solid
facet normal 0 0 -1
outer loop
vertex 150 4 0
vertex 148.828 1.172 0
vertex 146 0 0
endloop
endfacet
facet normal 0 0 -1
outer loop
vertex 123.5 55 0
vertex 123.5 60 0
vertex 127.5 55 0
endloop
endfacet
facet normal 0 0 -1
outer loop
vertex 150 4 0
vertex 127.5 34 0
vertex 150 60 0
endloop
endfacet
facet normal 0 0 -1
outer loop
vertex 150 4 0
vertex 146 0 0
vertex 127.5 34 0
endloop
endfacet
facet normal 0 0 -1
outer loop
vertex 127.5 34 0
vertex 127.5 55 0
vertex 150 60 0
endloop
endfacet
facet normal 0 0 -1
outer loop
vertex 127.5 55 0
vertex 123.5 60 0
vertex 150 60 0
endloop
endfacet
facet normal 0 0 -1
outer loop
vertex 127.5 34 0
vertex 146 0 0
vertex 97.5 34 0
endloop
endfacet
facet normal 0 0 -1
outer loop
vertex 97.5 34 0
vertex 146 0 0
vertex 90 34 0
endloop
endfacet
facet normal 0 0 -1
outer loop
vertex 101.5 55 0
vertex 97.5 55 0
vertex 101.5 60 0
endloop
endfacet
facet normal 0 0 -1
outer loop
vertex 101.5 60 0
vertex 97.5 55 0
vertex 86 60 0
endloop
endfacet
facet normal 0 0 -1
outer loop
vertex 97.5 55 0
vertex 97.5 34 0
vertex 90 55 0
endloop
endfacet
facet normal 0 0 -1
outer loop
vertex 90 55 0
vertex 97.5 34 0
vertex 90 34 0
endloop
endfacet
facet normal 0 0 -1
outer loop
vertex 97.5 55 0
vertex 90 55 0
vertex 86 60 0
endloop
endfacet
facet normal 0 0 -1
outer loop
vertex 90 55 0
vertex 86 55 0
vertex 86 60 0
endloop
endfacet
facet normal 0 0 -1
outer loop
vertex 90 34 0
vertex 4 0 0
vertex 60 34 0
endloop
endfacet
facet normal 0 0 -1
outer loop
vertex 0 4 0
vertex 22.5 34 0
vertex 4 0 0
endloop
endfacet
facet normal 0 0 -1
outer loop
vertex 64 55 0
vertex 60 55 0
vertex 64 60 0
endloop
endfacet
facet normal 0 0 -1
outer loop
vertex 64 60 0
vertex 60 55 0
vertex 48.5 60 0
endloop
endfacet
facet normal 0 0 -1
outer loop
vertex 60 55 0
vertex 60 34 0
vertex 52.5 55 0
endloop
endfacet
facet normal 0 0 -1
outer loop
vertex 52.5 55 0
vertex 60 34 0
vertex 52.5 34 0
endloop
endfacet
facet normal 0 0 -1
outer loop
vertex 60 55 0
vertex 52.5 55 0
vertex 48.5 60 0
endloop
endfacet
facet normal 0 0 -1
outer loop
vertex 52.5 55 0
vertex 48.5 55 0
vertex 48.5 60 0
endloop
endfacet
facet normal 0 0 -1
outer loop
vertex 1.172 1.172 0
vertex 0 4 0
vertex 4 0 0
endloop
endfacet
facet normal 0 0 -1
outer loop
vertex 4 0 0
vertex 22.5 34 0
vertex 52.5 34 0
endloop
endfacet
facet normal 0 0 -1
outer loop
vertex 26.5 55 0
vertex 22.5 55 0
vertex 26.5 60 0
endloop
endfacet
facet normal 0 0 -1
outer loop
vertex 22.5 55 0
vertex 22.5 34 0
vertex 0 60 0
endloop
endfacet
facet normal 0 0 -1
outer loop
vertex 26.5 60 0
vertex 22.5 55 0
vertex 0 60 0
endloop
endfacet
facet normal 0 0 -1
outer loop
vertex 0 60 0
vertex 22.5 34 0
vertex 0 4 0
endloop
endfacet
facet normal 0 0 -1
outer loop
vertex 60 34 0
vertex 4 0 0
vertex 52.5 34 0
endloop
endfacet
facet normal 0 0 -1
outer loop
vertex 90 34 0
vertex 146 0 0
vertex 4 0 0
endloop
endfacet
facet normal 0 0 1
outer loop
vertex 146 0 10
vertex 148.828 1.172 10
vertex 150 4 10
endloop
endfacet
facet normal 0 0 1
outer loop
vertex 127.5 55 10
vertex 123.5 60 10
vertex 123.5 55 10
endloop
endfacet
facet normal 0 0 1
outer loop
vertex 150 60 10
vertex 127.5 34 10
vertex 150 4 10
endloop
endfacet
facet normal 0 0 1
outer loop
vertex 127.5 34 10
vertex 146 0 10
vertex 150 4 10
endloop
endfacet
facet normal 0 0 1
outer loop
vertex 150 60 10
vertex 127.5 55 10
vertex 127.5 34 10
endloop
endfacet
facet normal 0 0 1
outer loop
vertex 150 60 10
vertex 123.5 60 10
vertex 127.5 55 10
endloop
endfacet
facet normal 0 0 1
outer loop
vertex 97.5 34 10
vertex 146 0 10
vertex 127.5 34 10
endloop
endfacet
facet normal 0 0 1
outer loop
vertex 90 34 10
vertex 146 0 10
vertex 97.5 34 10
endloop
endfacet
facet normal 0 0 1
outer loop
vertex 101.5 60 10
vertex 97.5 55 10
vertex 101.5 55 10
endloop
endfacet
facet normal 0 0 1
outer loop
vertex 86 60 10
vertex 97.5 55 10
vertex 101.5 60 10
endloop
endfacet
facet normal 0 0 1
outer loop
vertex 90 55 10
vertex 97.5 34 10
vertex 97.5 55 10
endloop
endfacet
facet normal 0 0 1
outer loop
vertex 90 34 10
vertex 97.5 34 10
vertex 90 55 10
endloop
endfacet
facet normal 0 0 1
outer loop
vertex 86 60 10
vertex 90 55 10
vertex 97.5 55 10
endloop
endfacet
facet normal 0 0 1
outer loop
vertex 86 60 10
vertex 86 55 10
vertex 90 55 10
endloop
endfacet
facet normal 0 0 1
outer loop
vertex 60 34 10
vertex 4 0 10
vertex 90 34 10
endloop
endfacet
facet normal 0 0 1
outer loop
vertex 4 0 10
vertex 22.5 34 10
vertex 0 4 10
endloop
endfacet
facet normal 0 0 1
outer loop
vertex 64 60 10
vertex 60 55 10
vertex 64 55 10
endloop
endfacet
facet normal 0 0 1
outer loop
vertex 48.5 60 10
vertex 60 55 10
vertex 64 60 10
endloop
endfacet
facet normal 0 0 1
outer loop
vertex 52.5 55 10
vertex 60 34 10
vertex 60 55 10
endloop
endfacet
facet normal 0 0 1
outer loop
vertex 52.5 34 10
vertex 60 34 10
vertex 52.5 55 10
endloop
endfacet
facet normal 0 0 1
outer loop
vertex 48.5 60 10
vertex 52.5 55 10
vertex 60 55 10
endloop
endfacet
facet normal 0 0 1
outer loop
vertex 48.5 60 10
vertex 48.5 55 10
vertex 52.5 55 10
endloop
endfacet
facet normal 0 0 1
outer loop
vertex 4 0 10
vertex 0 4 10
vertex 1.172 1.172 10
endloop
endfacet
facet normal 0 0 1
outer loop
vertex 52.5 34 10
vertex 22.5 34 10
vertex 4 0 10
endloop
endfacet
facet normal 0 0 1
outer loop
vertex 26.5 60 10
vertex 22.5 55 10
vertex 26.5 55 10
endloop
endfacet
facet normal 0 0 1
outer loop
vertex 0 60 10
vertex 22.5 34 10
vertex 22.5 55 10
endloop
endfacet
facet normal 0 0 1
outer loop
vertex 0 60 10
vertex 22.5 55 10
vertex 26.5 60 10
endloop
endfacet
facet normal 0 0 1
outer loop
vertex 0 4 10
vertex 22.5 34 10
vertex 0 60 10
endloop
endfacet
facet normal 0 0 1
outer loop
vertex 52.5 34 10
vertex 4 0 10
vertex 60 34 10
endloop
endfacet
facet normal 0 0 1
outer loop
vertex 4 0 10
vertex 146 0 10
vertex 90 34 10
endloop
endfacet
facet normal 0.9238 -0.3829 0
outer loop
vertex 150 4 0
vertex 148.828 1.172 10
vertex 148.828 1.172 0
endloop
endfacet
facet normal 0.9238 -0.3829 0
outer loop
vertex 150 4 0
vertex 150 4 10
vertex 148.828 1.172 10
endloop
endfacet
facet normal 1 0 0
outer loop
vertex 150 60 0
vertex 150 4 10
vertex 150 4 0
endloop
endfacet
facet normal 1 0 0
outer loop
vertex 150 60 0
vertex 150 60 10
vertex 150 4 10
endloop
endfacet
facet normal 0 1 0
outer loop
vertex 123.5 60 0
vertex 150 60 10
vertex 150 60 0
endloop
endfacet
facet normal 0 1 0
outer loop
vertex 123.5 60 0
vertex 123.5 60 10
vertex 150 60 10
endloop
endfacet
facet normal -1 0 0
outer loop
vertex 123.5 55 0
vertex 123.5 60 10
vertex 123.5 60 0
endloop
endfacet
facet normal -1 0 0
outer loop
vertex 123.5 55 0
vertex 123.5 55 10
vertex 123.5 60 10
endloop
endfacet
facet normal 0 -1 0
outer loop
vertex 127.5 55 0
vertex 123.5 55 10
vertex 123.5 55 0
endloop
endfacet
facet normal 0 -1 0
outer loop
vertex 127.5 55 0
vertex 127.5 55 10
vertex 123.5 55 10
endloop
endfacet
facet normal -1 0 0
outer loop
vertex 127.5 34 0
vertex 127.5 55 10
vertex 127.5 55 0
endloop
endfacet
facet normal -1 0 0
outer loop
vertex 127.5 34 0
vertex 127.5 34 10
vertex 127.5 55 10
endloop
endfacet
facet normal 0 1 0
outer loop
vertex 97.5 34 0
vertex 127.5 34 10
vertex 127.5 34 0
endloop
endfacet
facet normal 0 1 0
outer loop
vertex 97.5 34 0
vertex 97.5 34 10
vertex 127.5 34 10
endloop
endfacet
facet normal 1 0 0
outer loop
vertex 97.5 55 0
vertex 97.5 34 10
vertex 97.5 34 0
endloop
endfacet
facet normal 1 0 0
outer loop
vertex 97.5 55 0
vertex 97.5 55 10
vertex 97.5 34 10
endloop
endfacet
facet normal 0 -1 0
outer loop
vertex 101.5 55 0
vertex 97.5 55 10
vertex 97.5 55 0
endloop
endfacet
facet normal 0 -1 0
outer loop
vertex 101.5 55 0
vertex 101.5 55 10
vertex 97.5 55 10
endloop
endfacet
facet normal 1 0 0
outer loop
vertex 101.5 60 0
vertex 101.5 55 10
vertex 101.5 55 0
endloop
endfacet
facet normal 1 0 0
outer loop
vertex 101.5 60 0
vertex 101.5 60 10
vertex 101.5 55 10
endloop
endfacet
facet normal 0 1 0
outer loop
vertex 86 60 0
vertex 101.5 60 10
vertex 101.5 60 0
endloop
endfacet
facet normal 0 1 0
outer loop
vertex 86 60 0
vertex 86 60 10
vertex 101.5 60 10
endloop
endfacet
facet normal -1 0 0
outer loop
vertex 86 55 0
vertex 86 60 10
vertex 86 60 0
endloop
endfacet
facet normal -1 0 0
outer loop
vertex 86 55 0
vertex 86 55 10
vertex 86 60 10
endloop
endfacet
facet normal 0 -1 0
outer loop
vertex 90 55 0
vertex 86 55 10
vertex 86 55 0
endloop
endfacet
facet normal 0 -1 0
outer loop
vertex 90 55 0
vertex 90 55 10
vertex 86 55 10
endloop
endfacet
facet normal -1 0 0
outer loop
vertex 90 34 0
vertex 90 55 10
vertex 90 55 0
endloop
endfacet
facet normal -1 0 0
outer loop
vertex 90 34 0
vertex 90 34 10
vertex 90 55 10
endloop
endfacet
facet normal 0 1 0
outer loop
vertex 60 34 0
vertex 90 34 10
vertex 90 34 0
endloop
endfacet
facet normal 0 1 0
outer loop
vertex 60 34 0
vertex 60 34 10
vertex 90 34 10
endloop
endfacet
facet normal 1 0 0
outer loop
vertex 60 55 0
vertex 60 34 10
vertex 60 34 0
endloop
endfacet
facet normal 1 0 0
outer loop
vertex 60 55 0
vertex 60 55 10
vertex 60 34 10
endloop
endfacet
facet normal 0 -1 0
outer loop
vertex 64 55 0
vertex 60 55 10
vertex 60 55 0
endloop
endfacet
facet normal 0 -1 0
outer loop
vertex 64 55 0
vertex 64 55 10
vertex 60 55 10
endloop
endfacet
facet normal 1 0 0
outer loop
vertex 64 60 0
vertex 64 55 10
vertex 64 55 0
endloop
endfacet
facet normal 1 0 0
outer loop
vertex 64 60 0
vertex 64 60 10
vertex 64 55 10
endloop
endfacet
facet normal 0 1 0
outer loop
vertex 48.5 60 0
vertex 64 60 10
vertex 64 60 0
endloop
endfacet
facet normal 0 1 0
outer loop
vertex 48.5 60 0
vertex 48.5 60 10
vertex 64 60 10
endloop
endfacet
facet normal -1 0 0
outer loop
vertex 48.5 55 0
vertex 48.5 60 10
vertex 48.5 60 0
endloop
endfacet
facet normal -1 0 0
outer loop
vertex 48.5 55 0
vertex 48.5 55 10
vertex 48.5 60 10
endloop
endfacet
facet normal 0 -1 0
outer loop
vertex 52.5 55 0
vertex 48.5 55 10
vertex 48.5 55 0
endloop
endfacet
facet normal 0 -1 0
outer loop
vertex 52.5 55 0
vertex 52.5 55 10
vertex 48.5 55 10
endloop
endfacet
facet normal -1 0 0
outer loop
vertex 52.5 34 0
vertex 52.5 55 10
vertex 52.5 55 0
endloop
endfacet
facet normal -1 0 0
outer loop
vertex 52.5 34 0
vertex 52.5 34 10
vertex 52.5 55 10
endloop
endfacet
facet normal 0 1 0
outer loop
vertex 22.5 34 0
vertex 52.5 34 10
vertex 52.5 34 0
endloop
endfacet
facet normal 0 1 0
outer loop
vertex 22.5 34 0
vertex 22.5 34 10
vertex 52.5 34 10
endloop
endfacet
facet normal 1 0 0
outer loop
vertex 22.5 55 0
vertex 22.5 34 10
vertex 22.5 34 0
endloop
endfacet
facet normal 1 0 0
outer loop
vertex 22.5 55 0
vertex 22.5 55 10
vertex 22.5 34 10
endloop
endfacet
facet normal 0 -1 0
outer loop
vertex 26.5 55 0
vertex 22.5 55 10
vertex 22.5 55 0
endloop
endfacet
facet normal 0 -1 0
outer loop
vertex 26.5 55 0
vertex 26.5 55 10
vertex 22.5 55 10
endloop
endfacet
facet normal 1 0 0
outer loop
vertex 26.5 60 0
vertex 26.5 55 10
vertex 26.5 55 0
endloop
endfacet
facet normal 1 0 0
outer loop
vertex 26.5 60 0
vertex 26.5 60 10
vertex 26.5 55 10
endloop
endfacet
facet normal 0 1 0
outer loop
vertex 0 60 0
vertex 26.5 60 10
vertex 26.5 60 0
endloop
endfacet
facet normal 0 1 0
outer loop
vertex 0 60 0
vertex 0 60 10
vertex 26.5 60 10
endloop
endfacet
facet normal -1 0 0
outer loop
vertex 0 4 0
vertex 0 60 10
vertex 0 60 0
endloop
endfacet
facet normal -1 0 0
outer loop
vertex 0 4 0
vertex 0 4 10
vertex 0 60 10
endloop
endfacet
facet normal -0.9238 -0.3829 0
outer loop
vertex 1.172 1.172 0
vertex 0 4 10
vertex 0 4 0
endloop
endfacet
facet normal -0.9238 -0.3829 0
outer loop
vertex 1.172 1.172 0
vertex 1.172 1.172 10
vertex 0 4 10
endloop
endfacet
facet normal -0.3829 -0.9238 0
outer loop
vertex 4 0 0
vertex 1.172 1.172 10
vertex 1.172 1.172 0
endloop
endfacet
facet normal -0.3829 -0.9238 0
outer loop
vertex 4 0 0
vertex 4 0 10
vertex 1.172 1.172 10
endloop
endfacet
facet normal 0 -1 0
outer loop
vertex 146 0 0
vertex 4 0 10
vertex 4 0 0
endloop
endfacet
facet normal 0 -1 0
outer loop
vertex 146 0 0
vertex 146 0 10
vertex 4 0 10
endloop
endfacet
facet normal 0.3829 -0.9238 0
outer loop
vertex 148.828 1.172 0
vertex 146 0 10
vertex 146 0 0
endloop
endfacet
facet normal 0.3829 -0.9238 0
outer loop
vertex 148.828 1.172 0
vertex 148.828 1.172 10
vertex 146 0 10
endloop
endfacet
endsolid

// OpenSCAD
$fn = 32;

// ----------------------------------------------------------------------
// Oversize slot bar: 150 mm bar with 3 oversize windows
// ----------------------------------------------------------------------

// --- parameters (mm) ---
profile_height = 10;      // extrusion height
profile_points = 32;      // points of the closed outline

profile = [[0, 4], [1.172, 1.172], [4, 0], [146, 0], [148.828, 1.172], [150, 4], [150, 60], [123.5, 60], [123.5, 55], [127.5, 55], [127.5, 34], [97.5, 34], [97.5, 55], [101.5, 55], [101.5, 60], [86, 60], [86, 55], [90, 55], [90, 34], [60, 34], [60, 55], [64, 55], [64, 60], [48.5, 60], [48.5, 55], [52.5, 55], [52.5, 34], [22.5, 34], [22.5, 55], [26.5, 55], [26.5, 60], [0, 60]];  // single closed polygon, 32 points, counter clockwise

// --- the one profile operation ---
linear_extrude(height = profile_height) polygon(points = profile);
